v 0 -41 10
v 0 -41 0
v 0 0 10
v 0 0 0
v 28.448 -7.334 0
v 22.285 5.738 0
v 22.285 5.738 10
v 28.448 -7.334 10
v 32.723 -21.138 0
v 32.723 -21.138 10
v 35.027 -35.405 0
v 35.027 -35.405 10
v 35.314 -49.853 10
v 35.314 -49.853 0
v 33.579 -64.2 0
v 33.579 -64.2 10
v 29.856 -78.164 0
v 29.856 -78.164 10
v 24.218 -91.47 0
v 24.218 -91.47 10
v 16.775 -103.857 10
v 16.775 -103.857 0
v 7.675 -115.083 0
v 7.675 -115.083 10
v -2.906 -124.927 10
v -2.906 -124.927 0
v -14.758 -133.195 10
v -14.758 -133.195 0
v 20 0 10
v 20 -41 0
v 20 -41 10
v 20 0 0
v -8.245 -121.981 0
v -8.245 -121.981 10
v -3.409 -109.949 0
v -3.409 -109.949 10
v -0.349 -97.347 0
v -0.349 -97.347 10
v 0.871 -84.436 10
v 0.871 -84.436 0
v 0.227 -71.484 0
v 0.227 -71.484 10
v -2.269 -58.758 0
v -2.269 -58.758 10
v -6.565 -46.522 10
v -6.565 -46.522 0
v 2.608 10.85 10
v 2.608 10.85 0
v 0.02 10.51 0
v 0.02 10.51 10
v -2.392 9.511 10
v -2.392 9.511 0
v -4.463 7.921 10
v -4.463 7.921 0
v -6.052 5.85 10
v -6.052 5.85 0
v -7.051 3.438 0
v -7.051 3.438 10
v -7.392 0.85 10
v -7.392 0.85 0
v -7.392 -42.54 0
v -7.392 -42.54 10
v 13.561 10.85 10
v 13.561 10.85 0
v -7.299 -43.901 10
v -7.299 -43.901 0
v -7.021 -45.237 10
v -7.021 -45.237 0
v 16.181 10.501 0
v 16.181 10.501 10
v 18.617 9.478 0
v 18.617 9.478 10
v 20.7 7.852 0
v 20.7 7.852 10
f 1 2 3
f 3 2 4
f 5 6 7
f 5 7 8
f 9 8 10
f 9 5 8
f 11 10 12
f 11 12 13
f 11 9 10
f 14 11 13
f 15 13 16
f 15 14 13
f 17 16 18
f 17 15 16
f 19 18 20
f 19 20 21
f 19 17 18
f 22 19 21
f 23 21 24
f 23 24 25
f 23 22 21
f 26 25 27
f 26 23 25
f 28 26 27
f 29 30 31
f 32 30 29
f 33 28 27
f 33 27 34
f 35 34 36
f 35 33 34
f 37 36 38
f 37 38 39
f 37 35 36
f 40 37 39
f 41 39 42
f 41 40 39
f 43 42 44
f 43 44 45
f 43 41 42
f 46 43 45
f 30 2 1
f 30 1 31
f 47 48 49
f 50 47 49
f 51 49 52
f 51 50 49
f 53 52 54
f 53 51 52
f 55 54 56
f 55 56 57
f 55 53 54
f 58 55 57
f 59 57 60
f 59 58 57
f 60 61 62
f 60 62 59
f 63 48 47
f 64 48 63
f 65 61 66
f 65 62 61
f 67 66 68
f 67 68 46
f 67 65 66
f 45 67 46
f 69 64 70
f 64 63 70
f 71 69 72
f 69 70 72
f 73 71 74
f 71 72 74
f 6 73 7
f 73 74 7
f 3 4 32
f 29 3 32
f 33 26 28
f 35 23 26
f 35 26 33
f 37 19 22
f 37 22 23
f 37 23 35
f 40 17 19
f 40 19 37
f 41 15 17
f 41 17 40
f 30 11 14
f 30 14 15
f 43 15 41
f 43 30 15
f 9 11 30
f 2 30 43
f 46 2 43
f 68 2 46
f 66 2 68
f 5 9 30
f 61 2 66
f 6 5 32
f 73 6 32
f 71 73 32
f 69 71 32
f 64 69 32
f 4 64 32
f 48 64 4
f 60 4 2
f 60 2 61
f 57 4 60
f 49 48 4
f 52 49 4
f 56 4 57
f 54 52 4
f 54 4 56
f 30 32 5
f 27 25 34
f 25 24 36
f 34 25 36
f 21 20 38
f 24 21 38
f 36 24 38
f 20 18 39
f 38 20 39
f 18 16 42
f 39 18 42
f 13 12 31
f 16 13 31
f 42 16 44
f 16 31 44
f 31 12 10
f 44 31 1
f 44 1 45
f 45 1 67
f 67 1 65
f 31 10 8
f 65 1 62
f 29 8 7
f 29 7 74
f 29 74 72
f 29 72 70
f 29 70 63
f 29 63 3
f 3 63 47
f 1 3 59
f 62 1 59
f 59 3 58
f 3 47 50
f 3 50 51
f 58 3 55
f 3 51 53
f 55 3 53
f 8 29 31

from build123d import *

# Parameters (mm, degrees)
ESQUISSE1_W        = 20
ESQUISSE1_H        = 41
BOSS_EXTRU_1_DEPTH = 10
CONG_1_R           = 10
CONG_2_R           = 10


with BuildPart() as part:
    # Esquisse1 → Boss.-Extru.1 (new body)
    with BuildSketch(Plane.XY):
        with BuildLine():
            Line((-7.391944515, 10.850266565), (19.223939946, 10.850266565))
            ThreePointArc((19.223939946, 10.850266565), (32.688147419, -68.35721731), (-14.757789944, -133.195426819))
            ThreePointArc((-14.757789944, -133.195426819), (0.583223132, -89.904856397), (-7.391944515, -44.674149232))
            Line((-7.391944515, -44.674149232), (-7.391944515, 10.850266565))
        make_face()
        with Locations((10, -20.5)):
            Rectangle(ESQUISSE1_W, ESQUISSE1_H, mode=Mode.SUBTRACT)
    extrude(amount=BOSS_EXTRU_1_DEPTH)

    # Congé1
    cong_1_edges = [part.edges().sort_by_distance(p)[0] for p in [
        (19.223939946, 10.850266565, 5),
    ]]
    fillet(cong_1_edges, radius=CONG_1_R)

    # Congé2
    cong_2_edges = [part.edges().sort_by_distance(p)[0] for p in [
        (-7.391944515, -44.674149232, 5),
        (-7.391944515, 10.850266565, 5),
    ]]
    fillet(cong_2_edges, radius=CONG_2_R)


solid = part.part
